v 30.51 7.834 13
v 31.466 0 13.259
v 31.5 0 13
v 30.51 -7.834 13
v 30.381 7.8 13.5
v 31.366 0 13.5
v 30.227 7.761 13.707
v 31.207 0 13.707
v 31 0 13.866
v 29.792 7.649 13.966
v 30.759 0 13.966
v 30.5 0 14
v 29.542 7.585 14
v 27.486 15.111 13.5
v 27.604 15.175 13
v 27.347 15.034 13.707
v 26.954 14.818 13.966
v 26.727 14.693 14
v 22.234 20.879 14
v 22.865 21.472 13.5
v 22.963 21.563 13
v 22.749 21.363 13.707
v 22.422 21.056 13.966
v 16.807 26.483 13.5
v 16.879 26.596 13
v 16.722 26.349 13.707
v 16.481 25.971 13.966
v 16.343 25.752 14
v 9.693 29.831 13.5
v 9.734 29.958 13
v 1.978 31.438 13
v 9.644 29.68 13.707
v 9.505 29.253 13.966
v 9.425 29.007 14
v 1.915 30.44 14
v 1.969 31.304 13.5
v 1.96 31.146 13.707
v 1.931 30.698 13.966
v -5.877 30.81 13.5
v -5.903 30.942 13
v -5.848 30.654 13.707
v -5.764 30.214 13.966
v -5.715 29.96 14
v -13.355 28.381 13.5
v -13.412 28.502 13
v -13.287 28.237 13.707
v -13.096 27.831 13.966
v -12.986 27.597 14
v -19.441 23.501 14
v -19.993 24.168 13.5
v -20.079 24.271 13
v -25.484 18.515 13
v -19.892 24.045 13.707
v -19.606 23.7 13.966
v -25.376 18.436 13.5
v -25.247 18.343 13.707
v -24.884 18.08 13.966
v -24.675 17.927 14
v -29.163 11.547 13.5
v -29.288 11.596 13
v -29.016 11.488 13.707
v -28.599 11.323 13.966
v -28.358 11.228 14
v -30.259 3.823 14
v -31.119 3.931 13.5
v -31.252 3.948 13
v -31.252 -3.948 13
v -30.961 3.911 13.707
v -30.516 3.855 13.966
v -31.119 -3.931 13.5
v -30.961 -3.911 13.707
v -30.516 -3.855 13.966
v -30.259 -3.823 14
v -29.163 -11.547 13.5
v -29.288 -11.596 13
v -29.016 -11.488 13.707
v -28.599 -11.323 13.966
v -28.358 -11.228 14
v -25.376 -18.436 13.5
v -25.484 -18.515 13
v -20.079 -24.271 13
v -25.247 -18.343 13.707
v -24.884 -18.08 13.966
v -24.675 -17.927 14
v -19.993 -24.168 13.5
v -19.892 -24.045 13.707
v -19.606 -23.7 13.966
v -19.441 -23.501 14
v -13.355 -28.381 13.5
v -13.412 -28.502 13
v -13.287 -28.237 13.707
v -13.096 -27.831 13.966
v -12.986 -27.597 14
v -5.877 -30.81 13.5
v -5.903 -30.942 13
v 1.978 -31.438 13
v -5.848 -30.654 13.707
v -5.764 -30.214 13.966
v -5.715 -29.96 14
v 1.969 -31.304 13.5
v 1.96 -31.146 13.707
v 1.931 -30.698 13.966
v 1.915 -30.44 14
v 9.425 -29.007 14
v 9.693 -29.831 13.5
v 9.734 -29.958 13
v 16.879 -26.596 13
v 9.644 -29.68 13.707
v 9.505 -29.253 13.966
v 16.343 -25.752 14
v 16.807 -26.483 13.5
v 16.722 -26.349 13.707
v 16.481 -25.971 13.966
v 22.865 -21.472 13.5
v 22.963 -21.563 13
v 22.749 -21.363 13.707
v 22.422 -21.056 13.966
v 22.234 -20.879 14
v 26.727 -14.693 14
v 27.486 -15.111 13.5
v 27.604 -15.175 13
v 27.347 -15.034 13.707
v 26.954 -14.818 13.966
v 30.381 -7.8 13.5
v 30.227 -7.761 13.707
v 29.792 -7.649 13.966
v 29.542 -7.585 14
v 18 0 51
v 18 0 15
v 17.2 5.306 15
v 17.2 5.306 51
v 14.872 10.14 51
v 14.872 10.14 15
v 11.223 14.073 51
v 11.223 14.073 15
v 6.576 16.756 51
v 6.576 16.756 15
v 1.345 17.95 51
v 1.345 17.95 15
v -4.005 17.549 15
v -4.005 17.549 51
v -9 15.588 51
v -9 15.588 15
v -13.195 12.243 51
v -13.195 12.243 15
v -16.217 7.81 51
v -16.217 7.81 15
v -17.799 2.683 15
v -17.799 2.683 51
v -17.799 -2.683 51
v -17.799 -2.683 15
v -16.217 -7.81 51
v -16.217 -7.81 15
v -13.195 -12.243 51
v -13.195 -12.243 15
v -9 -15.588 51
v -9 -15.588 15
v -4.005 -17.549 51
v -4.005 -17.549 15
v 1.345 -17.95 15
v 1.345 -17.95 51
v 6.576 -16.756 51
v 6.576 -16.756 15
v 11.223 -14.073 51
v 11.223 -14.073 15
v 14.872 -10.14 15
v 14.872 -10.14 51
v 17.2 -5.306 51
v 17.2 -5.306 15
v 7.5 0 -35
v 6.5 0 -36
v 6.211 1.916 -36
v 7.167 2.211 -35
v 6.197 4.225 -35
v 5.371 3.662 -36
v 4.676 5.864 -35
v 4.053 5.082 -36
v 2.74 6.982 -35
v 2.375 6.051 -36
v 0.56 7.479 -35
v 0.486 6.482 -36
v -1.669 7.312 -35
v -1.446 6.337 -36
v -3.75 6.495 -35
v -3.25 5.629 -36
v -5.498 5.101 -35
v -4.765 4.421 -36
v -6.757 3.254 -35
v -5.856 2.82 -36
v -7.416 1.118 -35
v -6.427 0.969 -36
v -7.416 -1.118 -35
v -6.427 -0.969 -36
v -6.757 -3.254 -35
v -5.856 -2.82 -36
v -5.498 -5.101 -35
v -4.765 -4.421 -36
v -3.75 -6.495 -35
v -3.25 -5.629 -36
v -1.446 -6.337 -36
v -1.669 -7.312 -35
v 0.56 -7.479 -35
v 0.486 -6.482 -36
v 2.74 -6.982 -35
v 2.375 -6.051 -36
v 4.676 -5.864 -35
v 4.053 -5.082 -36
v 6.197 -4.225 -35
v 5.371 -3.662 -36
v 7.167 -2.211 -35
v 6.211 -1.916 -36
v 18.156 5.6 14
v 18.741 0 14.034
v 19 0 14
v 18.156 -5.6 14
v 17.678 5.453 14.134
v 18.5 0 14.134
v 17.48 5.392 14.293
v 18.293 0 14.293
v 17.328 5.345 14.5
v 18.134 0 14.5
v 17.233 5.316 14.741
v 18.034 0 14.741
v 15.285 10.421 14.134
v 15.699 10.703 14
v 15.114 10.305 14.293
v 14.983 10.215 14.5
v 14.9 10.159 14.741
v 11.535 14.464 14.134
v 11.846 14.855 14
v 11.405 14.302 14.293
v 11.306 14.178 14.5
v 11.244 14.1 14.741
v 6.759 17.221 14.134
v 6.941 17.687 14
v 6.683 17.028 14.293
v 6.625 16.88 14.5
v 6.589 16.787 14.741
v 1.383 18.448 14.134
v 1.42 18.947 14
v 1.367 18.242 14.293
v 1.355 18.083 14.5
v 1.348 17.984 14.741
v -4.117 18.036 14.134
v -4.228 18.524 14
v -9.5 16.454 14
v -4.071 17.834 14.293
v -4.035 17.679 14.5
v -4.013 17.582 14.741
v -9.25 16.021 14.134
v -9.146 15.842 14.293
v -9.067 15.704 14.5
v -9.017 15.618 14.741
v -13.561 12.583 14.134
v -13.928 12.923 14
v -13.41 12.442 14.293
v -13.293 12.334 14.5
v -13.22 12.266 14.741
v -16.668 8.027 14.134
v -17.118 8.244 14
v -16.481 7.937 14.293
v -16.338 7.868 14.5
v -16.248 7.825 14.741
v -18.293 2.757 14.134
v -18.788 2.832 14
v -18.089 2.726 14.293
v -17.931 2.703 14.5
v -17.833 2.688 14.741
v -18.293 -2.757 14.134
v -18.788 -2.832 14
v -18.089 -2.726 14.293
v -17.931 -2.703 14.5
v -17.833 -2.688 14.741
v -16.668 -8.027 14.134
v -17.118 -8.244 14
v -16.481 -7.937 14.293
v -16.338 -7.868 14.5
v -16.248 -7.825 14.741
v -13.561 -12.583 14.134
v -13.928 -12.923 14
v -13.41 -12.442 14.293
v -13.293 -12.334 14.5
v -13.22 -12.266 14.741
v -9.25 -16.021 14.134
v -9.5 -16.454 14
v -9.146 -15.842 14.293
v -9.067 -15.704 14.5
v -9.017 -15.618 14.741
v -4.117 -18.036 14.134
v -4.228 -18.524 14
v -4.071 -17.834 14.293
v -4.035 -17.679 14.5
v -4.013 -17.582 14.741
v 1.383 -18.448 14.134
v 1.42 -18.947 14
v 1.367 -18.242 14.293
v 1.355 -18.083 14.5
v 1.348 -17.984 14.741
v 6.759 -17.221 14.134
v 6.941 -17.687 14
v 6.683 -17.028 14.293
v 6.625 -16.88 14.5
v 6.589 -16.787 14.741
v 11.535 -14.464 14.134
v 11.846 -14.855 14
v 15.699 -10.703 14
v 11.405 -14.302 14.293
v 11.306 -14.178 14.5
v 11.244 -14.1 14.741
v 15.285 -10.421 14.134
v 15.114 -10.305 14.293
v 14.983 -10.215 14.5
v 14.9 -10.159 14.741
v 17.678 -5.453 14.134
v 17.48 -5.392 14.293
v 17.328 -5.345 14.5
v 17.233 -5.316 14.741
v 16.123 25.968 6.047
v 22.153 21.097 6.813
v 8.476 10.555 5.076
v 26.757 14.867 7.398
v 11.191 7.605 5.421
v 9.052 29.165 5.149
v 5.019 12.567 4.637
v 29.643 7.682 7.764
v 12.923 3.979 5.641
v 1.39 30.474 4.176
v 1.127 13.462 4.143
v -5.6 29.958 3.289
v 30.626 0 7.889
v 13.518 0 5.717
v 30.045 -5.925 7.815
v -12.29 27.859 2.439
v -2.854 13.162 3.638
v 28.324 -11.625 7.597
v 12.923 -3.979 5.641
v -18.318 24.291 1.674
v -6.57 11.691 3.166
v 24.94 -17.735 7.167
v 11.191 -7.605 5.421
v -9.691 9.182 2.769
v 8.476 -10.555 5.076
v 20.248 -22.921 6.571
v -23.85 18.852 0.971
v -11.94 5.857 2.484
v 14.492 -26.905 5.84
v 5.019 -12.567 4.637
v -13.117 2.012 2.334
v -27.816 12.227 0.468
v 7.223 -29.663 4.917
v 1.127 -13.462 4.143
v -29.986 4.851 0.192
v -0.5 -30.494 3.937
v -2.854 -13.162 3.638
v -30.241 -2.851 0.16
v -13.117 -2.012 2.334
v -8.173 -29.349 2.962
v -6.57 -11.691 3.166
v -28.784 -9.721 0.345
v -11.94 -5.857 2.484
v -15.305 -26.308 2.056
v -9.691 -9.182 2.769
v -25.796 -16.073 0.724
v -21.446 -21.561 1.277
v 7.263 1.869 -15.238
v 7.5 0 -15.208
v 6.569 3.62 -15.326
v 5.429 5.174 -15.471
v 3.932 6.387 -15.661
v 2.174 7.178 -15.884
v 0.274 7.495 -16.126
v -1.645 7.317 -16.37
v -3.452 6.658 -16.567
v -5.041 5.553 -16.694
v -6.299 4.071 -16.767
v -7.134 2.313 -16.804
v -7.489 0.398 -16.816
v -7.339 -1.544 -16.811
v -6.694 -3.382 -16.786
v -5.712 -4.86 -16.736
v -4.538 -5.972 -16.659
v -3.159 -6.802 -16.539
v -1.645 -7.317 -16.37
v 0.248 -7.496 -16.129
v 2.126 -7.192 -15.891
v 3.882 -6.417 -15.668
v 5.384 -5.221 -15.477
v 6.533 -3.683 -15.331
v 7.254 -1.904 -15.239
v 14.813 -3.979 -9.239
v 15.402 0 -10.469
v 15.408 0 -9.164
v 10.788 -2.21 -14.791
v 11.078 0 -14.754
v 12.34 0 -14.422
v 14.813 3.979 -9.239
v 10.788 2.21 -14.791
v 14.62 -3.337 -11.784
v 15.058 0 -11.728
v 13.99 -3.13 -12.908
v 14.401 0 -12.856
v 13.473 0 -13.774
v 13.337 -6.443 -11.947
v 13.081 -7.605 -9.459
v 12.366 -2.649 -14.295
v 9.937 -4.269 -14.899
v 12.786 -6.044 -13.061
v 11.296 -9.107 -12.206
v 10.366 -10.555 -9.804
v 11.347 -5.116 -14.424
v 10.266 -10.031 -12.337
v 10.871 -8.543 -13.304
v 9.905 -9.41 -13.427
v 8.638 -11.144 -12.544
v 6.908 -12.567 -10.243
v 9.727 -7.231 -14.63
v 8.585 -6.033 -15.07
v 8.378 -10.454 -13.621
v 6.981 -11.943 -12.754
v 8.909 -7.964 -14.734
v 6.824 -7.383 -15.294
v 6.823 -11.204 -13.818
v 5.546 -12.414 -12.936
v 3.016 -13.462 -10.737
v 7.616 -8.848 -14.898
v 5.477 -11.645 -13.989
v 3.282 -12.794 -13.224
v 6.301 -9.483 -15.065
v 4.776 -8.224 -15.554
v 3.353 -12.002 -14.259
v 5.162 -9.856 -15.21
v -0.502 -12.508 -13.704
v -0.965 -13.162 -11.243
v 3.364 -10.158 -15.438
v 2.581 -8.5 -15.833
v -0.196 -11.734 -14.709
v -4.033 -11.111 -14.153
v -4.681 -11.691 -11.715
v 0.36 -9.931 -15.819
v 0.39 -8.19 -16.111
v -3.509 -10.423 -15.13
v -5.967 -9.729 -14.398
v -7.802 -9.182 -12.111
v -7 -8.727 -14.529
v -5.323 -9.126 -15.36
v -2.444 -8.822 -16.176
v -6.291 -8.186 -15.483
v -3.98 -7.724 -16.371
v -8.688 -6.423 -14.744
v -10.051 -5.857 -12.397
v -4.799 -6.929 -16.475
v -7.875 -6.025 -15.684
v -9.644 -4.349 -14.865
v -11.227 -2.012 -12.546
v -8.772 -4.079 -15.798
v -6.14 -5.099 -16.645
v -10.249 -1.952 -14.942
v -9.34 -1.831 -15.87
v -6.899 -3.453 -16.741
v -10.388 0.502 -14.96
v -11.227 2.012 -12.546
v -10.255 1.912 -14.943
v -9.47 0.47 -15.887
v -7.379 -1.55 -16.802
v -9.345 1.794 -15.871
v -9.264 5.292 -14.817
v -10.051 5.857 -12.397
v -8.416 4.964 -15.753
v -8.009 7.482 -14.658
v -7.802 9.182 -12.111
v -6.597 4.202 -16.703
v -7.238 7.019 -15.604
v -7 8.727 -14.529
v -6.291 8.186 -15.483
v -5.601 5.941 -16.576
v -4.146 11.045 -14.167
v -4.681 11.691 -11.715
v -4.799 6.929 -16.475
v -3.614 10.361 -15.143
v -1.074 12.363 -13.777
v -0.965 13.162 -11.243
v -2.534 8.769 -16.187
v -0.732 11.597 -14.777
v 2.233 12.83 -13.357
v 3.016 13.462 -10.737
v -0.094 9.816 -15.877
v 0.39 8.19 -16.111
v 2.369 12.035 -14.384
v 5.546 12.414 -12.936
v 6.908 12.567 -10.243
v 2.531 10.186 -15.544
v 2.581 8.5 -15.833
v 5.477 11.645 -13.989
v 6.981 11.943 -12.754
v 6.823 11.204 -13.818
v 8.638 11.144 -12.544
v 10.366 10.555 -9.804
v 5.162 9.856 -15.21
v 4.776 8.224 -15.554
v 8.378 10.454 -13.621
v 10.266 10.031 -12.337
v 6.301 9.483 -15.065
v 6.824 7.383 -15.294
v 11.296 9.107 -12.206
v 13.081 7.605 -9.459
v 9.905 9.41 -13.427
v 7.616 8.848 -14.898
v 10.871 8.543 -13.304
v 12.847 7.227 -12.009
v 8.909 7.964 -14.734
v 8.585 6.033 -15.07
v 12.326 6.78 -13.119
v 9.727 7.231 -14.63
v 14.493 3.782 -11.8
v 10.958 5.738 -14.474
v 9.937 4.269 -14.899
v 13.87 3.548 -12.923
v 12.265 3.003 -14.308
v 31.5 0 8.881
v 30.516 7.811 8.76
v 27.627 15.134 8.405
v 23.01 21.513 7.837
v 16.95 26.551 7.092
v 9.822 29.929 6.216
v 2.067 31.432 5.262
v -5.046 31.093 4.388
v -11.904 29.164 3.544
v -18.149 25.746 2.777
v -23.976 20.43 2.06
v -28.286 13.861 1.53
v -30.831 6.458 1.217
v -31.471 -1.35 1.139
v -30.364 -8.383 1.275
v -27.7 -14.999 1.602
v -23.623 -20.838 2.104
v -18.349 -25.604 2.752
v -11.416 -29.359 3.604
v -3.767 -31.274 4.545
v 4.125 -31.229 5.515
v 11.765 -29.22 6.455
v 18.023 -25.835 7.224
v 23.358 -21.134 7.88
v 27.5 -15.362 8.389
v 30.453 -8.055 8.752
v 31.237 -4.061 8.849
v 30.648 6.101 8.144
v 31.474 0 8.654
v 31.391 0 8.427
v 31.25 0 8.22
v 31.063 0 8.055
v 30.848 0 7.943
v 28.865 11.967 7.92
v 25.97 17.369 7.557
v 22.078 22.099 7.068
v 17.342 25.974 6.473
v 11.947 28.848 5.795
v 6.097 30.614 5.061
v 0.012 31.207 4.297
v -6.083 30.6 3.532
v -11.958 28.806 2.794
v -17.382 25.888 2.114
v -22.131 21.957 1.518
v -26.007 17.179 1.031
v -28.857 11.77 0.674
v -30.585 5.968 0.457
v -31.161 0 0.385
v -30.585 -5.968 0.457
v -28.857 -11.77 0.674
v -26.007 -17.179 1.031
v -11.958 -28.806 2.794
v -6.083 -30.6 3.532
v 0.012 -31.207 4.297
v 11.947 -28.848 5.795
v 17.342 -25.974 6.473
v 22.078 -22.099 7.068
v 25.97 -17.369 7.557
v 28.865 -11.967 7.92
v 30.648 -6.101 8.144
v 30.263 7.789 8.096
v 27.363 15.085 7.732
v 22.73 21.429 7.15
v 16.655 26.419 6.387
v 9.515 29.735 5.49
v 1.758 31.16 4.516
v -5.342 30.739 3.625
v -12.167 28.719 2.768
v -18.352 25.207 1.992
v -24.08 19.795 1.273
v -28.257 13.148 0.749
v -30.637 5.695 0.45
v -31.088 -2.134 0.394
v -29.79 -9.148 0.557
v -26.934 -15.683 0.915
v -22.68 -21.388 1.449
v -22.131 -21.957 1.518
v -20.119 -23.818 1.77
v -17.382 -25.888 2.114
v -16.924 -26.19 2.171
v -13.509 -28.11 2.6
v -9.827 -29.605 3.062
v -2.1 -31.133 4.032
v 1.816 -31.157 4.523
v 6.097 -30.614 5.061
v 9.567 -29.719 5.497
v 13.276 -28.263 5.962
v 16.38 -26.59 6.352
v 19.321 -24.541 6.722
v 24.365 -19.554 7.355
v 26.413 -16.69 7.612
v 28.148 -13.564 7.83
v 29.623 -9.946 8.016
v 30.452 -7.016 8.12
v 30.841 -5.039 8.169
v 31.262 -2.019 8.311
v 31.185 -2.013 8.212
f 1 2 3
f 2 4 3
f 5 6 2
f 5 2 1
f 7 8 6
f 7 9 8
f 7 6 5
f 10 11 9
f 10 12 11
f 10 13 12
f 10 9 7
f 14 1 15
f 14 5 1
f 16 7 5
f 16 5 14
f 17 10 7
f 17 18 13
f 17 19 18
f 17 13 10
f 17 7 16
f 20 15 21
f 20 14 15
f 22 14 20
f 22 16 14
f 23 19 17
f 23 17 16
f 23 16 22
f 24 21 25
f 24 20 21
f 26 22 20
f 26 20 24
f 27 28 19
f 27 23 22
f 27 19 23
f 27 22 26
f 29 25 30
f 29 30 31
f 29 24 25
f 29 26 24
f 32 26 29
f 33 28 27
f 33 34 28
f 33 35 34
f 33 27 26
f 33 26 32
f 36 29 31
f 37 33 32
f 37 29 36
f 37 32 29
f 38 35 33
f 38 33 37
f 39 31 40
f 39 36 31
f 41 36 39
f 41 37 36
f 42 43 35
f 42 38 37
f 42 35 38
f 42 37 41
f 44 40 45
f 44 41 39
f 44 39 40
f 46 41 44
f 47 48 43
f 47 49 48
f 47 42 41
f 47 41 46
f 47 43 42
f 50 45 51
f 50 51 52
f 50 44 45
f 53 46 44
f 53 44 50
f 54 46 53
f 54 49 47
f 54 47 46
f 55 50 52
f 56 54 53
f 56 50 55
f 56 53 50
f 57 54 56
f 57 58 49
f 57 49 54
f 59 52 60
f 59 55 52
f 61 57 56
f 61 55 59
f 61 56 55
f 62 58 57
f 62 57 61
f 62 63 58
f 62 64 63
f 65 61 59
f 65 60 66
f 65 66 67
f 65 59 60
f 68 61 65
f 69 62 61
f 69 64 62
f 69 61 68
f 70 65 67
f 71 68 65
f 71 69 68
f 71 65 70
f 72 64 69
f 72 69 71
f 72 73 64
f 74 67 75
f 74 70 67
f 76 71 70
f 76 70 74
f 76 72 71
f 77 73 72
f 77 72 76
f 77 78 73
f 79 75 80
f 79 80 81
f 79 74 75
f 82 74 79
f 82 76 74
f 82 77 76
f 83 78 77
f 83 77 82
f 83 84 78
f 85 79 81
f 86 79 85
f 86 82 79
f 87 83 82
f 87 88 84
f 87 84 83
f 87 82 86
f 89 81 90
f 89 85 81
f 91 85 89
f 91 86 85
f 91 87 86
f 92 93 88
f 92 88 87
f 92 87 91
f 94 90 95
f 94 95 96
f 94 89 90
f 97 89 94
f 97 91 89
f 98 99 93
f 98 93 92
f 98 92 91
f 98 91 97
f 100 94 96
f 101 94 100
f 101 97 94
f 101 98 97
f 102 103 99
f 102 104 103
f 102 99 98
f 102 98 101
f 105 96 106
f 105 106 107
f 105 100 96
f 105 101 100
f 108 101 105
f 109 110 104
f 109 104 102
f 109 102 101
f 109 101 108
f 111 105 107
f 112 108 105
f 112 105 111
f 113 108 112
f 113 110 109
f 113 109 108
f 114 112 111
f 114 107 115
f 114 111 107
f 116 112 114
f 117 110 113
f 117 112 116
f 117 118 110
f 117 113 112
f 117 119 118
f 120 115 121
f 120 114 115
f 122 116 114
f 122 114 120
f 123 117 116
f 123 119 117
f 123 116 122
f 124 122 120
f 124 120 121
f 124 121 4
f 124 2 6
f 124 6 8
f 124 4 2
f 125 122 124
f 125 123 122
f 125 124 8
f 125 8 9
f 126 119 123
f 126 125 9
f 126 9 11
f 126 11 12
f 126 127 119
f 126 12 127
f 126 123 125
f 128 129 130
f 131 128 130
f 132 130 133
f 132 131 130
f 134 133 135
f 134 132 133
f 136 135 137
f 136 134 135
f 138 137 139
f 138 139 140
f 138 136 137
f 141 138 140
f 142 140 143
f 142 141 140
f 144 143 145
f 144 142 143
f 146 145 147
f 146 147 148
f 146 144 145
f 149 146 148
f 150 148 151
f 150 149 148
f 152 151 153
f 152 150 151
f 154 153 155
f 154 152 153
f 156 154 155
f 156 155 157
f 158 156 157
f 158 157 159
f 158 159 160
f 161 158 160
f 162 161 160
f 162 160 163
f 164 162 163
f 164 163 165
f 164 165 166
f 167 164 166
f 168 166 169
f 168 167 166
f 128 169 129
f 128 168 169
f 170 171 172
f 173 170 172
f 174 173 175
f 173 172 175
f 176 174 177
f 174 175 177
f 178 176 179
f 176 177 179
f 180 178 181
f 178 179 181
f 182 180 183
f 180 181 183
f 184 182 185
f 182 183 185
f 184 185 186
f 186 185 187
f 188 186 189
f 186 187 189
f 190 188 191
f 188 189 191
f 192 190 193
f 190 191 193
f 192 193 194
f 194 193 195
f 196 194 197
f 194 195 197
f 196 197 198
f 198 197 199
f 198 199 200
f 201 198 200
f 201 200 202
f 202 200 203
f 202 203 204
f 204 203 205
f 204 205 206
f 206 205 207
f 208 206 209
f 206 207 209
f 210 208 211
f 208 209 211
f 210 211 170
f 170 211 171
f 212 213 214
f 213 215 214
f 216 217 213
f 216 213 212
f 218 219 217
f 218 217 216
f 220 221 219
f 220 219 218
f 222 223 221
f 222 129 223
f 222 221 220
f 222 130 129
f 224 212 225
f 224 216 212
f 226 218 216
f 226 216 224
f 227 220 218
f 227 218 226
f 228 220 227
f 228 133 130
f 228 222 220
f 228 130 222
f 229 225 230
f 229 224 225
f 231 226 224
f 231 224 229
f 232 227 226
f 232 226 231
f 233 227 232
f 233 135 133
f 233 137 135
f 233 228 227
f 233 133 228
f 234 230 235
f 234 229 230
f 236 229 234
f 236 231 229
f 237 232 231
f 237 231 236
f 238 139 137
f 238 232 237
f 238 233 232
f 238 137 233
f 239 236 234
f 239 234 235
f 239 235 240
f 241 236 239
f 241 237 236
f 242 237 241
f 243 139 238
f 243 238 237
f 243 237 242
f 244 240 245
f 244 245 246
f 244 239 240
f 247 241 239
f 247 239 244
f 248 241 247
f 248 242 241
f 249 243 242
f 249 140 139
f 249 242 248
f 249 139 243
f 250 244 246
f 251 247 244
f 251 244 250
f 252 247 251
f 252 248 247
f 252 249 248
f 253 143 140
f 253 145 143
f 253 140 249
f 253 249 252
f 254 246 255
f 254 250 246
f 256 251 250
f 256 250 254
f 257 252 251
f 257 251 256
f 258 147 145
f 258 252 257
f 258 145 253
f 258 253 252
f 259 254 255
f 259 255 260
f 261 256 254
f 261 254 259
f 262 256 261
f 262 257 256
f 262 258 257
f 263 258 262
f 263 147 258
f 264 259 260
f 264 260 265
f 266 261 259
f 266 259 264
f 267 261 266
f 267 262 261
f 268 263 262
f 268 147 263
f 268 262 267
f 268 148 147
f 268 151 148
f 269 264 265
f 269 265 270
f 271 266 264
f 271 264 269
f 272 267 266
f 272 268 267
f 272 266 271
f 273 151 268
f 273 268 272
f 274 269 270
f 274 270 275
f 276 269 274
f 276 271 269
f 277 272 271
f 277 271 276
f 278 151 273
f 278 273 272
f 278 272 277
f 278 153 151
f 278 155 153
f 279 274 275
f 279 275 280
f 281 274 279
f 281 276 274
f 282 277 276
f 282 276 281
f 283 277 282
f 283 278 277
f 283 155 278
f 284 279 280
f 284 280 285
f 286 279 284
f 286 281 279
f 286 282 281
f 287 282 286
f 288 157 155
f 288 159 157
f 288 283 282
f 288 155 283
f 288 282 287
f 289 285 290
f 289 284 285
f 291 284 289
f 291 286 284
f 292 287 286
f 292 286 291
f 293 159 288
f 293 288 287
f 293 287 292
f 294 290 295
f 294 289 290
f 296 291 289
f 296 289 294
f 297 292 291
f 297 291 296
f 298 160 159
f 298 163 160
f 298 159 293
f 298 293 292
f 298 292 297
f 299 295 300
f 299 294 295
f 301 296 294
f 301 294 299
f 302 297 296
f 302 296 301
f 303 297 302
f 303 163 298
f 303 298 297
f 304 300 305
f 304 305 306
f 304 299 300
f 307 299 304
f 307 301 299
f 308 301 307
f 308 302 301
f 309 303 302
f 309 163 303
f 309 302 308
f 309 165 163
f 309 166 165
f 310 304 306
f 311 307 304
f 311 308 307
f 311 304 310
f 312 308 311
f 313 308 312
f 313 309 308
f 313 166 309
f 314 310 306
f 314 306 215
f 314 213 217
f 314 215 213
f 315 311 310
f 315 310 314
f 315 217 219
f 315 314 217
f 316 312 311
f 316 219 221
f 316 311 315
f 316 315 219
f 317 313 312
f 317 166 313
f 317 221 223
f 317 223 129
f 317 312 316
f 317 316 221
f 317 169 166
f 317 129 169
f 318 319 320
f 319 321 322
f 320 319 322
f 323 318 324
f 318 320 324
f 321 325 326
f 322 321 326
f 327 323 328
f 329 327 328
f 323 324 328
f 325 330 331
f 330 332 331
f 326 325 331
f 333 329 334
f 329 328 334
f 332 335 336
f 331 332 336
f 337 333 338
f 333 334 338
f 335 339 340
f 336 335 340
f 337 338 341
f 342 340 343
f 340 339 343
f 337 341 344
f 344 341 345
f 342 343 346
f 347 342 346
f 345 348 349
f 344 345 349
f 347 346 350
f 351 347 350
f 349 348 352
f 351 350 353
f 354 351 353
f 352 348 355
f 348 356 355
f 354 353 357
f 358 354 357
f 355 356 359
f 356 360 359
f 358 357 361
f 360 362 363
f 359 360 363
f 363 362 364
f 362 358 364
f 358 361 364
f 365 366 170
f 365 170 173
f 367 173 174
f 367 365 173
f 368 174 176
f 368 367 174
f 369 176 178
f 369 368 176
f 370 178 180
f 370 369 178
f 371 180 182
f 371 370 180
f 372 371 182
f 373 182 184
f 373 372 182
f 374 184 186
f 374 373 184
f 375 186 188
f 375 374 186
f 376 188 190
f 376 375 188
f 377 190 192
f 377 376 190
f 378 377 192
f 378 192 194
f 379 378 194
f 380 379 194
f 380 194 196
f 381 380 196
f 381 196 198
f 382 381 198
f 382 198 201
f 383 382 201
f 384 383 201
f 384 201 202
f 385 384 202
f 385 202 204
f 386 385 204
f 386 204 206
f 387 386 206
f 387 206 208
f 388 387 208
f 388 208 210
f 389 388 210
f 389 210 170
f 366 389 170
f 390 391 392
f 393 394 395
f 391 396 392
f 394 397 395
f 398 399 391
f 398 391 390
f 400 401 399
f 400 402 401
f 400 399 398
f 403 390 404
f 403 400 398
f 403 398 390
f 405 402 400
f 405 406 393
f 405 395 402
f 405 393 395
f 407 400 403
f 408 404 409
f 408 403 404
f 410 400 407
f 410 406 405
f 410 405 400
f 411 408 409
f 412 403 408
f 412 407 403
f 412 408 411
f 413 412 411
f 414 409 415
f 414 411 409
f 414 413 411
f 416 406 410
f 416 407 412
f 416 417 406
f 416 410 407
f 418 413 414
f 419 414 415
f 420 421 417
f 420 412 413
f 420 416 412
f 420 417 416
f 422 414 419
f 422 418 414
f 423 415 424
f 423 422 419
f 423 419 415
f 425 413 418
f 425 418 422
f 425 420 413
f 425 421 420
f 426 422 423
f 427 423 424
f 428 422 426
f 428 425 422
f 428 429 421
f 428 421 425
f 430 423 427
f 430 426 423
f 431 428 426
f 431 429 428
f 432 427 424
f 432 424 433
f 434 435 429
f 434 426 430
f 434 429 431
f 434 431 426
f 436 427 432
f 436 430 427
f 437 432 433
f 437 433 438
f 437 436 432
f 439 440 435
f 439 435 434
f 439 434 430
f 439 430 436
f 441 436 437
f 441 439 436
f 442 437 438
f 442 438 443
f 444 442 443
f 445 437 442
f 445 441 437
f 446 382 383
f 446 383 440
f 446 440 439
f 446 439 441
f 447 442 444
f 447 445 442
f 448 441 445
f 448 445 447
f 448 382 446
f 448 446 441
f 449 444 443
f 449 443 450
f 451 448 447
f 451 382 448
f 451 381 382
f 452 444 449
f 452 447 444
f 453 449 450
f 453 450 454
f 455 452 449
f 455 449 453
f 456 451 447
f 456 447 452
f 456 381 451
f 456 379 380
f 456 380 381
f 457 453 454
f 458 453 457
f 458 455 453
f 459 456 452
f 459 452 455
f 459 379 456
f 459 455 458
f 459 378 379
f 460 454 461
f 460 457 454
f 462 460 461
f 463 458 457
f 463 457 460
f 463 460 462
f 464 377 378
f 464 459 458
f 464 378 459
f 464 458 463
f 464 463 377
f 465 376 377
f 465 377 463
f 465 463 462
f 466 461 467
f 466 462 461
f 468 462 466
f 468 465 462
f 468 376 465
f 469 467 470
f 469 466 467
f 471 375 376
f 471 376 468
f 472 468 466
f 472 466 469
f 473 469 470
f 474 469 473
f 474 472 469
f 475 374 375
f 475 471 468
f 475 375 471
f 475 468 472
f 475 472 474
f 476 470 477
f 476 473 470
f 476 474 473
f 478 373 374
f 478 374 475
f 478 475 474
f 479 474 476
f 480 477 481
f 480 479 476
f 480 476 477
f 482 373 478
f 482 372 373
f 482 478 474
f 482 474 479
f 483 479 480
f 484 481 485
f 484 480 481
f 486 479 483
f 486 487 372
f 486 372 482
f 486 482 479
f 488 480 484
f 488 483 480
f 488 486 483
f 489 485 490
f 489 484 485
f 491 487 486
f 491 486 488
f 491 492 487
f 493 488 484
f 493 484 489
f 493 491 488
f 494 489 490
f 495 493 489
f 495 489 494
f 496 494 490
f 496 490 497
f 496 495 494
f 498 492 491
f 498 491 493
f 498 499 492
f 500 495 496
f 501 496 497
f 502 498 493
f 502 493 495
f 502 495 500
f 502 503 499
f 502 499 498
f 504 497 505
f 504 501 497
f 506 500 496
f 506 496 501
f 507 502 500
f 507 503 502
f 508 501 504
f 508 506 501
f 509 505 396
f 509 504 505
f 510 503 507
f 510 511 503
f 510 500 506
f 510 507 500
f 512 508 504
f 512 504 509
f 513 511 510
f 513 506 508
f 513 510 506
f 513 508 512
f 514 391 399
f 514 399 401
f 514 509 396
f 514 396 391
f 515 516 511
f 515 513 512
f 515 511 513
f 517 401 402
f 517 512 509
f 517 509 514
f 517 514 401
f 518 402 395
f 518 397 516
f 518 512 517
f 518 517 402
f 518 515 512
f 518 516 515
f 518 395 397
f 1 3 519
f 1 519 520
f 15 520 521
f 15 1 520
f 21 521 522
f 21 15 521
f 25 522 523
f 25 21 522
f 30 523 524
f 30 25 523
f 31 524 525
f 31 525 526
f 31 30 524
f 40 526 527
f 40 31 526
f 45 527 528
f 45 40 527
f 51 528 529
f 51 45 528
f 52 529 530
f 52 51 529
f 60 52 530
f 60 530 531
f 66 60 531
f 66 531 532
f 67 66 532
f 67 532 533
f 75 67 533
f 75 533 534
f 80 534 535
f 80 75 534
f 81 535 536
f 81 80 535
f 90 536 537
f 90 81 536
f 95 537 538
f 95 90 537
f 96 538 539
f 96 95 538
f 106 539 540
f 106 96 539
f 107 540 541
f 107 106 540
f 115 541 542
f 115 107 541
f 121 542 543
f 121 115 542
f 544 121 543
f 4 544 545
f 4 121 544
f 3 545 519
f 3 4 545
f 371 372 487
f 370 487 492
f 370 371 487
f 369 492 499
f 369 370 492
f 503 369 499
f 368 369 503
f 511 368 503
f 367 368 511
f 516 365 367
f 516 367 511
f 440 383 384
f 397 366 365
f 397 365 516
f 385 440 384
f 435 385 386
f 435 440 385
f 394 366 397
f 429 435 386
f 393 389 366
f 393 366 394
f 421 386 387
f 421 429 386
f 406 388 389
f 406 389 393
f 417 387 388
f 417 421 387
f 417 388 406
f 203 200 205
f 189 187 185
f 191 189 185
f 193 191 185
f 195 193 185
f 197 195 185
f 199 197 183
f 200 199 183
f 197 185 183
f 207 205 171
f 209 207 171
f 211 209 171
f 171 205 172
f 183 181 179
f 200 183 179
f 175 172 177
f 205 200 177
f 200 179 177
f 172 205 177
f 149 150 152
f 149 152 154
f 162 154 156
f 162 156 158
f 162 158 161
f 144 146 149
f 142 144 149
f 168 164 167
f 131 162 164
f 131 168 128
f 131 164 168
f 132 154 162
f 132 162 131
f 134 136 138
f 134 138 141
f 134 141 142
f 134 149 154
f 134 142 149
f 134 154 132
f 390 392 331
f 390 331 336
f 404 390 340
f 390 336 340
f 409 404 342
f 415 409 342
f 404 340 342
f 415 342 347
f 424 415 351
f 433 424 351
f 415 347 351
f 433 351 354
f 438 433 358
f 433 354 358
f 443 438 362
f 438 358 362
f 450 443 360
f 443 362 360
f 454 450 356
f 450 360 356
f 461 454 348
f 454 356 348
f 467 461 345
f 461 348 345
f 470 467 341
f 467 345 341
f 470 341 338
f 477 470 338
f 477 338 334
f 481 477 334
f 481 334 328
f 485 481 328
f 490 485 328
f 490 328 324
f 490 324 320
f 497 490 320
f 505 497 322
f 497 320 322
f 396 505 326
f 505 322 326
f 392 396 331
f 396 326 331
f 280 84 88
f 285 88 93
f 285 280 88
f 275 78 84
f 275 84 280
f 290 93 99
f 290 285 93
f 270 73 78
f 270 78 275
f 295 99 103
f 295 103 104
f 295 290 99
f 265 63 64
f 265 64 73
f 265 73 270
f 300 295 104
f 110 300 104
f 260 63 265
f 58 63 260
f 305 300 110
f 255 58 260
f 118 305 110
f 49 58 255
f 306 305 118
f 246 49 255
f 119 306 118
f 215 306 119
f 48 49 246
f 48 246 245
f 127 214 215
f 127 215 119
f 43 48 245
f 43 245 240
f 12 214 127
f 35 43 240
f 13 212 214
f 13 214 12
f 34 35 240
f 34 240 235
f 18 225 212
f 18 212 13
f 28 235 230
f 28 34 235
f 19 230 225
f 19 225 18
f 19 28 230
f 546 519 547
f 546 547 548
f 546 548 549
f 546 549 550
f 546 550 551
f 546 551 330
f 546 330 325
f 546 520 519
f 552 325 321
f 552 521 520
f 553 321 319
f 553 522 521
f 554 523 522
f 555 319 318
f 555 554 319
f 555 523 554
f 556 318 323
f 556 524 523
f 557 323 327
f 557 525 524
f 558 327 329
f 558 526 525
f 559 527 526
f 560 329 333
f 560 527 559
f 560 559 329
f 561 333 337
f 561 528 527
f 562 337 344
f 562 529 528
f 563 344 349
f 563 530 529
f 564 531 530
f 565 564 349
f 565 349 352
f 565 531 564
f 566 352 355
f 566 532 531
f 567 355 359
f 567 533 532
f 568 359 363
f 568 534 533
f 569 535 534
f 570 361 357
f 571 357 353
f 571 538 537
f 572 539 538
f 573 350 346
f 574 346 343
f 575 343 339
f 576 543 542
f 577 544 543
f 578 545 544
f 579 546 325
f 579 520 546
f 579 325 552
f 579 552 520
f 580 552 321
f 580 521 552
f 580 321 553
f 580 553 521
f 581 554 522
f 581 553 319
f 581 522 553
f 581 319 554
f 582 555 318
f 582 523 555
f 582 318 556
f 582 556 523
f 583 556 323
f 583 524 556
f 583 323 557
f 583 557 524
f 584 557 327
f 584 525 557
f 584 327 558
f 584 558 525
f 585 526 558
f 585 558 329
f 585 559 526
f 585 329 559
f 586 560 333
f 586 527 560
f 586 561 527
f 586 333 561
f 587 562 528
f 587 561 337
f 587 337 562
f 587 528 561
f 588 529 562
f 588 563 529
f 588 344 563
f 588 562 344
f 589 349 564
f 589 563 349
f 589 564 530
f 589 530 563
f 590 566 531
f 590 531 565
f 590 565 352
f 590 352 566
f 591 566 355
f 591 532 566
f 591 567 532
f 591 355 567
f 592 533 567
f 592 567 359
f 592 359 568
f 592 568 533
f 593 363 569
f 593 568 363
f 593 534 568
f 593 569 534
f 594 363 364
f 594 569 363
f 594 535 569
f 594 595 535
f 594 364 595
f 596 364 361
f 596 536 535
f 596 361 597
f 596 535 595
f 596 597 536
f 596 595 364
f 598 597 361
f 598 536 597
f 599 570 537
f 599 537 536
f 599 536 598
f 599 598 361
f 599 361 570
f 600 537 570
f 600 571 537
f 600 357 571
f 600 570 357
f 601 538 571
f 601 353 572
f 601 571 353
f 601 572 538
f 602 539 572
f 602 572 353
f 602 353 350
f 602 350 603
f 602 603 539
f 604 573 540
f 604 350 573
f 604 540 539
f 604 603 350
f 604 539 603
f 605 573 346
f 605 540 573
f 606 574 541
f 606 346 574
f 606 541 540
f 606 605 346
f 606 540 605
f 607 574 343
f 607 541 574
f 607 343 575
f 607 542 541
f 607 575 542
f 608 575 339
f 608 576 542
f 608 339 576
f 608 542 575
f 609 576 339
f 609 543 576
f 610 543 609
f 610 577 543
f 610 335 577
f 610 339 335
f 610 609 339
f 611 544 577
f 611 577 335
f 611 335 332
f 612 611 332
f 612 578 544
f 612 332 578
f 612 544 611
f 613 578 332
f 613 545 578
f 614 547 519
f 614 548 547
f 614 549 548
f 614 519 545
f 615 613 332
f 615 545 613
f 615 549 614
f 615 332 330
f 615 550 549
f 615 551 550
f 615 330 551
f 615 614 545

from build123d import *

# Parameters (mm, degrees)
F3_DEPTH = 50
F4_R     = 1
F5_R     = 13.5
F6_DEPTH = 20
F7_R     = 5
F8_R     = 7.5
F9_DEPTH = 87
F10_SIZE = 1


with BuildPart() as f1:
    # F0 (on Front) → F1 (revolve)
    with BuildSketch(Plane.XZ):
        Polygon((0, 51), (0, 0), (31.5, 0), (31.5, 14), (18, 14), (18, 51), align=None)
    revolve(axis=Axis((0, 0, 24.5041578436), (0, 0, 1)))

    # F2 (on Front) → F3 (cut, symmetric)
    with BuildSketch(Plane.XZ):
        Polygon((31.5, 8), (-31.5, 0), (31.5, 0), align=None)
    extrude(amount=F3_DEPTH, both=True, mode=Mode.SUBTRACT)

    # F4
    f4_edges = [f1.edges().sort_by_distance(p)[0] for p in [
        (0, 31.5, 4),
        (0, -31.5, 4),
        (-31.5, 0, 14),
        (-18, 0, 14),
    ]]
    fillet(f4_edges, radius=F4_R)

    # F5 (on face) → F6 (join)
    with BuildSketch(Plane(origin=(-0.4998760228, 0, 3.9365236796), x_dir=(0.9920337292, 0, 0.125972537), z_dir=(0.125972537, 0, -0.9920337292))):
        with Locations((0.6308742752, 0)):
            Circle(F5_R)
    extrude(amount=F6_DEPTH)

    # F7
    f7_edges = [f1.edges().sort_by_distance(p)[0] for p in [
        (-10.747032, 0, -17.525307),
    ]]
    fillet(f7_edges, radius=F7_R)

    # F8 (on face) → F9 (join)
    with BuildSketch(Plane.XY.offset(51)):
        Circle(F8_R)
    extrude(amount=-F9_DEPTH)

    # F10
    f10_edges = [f1.edges().sort_by_distance(p)[0] for p in [
        (-7.5, 0, -36),
    ]]
    chamfer(f10_edges, length=F10_SIZE)


solid = f1.part
